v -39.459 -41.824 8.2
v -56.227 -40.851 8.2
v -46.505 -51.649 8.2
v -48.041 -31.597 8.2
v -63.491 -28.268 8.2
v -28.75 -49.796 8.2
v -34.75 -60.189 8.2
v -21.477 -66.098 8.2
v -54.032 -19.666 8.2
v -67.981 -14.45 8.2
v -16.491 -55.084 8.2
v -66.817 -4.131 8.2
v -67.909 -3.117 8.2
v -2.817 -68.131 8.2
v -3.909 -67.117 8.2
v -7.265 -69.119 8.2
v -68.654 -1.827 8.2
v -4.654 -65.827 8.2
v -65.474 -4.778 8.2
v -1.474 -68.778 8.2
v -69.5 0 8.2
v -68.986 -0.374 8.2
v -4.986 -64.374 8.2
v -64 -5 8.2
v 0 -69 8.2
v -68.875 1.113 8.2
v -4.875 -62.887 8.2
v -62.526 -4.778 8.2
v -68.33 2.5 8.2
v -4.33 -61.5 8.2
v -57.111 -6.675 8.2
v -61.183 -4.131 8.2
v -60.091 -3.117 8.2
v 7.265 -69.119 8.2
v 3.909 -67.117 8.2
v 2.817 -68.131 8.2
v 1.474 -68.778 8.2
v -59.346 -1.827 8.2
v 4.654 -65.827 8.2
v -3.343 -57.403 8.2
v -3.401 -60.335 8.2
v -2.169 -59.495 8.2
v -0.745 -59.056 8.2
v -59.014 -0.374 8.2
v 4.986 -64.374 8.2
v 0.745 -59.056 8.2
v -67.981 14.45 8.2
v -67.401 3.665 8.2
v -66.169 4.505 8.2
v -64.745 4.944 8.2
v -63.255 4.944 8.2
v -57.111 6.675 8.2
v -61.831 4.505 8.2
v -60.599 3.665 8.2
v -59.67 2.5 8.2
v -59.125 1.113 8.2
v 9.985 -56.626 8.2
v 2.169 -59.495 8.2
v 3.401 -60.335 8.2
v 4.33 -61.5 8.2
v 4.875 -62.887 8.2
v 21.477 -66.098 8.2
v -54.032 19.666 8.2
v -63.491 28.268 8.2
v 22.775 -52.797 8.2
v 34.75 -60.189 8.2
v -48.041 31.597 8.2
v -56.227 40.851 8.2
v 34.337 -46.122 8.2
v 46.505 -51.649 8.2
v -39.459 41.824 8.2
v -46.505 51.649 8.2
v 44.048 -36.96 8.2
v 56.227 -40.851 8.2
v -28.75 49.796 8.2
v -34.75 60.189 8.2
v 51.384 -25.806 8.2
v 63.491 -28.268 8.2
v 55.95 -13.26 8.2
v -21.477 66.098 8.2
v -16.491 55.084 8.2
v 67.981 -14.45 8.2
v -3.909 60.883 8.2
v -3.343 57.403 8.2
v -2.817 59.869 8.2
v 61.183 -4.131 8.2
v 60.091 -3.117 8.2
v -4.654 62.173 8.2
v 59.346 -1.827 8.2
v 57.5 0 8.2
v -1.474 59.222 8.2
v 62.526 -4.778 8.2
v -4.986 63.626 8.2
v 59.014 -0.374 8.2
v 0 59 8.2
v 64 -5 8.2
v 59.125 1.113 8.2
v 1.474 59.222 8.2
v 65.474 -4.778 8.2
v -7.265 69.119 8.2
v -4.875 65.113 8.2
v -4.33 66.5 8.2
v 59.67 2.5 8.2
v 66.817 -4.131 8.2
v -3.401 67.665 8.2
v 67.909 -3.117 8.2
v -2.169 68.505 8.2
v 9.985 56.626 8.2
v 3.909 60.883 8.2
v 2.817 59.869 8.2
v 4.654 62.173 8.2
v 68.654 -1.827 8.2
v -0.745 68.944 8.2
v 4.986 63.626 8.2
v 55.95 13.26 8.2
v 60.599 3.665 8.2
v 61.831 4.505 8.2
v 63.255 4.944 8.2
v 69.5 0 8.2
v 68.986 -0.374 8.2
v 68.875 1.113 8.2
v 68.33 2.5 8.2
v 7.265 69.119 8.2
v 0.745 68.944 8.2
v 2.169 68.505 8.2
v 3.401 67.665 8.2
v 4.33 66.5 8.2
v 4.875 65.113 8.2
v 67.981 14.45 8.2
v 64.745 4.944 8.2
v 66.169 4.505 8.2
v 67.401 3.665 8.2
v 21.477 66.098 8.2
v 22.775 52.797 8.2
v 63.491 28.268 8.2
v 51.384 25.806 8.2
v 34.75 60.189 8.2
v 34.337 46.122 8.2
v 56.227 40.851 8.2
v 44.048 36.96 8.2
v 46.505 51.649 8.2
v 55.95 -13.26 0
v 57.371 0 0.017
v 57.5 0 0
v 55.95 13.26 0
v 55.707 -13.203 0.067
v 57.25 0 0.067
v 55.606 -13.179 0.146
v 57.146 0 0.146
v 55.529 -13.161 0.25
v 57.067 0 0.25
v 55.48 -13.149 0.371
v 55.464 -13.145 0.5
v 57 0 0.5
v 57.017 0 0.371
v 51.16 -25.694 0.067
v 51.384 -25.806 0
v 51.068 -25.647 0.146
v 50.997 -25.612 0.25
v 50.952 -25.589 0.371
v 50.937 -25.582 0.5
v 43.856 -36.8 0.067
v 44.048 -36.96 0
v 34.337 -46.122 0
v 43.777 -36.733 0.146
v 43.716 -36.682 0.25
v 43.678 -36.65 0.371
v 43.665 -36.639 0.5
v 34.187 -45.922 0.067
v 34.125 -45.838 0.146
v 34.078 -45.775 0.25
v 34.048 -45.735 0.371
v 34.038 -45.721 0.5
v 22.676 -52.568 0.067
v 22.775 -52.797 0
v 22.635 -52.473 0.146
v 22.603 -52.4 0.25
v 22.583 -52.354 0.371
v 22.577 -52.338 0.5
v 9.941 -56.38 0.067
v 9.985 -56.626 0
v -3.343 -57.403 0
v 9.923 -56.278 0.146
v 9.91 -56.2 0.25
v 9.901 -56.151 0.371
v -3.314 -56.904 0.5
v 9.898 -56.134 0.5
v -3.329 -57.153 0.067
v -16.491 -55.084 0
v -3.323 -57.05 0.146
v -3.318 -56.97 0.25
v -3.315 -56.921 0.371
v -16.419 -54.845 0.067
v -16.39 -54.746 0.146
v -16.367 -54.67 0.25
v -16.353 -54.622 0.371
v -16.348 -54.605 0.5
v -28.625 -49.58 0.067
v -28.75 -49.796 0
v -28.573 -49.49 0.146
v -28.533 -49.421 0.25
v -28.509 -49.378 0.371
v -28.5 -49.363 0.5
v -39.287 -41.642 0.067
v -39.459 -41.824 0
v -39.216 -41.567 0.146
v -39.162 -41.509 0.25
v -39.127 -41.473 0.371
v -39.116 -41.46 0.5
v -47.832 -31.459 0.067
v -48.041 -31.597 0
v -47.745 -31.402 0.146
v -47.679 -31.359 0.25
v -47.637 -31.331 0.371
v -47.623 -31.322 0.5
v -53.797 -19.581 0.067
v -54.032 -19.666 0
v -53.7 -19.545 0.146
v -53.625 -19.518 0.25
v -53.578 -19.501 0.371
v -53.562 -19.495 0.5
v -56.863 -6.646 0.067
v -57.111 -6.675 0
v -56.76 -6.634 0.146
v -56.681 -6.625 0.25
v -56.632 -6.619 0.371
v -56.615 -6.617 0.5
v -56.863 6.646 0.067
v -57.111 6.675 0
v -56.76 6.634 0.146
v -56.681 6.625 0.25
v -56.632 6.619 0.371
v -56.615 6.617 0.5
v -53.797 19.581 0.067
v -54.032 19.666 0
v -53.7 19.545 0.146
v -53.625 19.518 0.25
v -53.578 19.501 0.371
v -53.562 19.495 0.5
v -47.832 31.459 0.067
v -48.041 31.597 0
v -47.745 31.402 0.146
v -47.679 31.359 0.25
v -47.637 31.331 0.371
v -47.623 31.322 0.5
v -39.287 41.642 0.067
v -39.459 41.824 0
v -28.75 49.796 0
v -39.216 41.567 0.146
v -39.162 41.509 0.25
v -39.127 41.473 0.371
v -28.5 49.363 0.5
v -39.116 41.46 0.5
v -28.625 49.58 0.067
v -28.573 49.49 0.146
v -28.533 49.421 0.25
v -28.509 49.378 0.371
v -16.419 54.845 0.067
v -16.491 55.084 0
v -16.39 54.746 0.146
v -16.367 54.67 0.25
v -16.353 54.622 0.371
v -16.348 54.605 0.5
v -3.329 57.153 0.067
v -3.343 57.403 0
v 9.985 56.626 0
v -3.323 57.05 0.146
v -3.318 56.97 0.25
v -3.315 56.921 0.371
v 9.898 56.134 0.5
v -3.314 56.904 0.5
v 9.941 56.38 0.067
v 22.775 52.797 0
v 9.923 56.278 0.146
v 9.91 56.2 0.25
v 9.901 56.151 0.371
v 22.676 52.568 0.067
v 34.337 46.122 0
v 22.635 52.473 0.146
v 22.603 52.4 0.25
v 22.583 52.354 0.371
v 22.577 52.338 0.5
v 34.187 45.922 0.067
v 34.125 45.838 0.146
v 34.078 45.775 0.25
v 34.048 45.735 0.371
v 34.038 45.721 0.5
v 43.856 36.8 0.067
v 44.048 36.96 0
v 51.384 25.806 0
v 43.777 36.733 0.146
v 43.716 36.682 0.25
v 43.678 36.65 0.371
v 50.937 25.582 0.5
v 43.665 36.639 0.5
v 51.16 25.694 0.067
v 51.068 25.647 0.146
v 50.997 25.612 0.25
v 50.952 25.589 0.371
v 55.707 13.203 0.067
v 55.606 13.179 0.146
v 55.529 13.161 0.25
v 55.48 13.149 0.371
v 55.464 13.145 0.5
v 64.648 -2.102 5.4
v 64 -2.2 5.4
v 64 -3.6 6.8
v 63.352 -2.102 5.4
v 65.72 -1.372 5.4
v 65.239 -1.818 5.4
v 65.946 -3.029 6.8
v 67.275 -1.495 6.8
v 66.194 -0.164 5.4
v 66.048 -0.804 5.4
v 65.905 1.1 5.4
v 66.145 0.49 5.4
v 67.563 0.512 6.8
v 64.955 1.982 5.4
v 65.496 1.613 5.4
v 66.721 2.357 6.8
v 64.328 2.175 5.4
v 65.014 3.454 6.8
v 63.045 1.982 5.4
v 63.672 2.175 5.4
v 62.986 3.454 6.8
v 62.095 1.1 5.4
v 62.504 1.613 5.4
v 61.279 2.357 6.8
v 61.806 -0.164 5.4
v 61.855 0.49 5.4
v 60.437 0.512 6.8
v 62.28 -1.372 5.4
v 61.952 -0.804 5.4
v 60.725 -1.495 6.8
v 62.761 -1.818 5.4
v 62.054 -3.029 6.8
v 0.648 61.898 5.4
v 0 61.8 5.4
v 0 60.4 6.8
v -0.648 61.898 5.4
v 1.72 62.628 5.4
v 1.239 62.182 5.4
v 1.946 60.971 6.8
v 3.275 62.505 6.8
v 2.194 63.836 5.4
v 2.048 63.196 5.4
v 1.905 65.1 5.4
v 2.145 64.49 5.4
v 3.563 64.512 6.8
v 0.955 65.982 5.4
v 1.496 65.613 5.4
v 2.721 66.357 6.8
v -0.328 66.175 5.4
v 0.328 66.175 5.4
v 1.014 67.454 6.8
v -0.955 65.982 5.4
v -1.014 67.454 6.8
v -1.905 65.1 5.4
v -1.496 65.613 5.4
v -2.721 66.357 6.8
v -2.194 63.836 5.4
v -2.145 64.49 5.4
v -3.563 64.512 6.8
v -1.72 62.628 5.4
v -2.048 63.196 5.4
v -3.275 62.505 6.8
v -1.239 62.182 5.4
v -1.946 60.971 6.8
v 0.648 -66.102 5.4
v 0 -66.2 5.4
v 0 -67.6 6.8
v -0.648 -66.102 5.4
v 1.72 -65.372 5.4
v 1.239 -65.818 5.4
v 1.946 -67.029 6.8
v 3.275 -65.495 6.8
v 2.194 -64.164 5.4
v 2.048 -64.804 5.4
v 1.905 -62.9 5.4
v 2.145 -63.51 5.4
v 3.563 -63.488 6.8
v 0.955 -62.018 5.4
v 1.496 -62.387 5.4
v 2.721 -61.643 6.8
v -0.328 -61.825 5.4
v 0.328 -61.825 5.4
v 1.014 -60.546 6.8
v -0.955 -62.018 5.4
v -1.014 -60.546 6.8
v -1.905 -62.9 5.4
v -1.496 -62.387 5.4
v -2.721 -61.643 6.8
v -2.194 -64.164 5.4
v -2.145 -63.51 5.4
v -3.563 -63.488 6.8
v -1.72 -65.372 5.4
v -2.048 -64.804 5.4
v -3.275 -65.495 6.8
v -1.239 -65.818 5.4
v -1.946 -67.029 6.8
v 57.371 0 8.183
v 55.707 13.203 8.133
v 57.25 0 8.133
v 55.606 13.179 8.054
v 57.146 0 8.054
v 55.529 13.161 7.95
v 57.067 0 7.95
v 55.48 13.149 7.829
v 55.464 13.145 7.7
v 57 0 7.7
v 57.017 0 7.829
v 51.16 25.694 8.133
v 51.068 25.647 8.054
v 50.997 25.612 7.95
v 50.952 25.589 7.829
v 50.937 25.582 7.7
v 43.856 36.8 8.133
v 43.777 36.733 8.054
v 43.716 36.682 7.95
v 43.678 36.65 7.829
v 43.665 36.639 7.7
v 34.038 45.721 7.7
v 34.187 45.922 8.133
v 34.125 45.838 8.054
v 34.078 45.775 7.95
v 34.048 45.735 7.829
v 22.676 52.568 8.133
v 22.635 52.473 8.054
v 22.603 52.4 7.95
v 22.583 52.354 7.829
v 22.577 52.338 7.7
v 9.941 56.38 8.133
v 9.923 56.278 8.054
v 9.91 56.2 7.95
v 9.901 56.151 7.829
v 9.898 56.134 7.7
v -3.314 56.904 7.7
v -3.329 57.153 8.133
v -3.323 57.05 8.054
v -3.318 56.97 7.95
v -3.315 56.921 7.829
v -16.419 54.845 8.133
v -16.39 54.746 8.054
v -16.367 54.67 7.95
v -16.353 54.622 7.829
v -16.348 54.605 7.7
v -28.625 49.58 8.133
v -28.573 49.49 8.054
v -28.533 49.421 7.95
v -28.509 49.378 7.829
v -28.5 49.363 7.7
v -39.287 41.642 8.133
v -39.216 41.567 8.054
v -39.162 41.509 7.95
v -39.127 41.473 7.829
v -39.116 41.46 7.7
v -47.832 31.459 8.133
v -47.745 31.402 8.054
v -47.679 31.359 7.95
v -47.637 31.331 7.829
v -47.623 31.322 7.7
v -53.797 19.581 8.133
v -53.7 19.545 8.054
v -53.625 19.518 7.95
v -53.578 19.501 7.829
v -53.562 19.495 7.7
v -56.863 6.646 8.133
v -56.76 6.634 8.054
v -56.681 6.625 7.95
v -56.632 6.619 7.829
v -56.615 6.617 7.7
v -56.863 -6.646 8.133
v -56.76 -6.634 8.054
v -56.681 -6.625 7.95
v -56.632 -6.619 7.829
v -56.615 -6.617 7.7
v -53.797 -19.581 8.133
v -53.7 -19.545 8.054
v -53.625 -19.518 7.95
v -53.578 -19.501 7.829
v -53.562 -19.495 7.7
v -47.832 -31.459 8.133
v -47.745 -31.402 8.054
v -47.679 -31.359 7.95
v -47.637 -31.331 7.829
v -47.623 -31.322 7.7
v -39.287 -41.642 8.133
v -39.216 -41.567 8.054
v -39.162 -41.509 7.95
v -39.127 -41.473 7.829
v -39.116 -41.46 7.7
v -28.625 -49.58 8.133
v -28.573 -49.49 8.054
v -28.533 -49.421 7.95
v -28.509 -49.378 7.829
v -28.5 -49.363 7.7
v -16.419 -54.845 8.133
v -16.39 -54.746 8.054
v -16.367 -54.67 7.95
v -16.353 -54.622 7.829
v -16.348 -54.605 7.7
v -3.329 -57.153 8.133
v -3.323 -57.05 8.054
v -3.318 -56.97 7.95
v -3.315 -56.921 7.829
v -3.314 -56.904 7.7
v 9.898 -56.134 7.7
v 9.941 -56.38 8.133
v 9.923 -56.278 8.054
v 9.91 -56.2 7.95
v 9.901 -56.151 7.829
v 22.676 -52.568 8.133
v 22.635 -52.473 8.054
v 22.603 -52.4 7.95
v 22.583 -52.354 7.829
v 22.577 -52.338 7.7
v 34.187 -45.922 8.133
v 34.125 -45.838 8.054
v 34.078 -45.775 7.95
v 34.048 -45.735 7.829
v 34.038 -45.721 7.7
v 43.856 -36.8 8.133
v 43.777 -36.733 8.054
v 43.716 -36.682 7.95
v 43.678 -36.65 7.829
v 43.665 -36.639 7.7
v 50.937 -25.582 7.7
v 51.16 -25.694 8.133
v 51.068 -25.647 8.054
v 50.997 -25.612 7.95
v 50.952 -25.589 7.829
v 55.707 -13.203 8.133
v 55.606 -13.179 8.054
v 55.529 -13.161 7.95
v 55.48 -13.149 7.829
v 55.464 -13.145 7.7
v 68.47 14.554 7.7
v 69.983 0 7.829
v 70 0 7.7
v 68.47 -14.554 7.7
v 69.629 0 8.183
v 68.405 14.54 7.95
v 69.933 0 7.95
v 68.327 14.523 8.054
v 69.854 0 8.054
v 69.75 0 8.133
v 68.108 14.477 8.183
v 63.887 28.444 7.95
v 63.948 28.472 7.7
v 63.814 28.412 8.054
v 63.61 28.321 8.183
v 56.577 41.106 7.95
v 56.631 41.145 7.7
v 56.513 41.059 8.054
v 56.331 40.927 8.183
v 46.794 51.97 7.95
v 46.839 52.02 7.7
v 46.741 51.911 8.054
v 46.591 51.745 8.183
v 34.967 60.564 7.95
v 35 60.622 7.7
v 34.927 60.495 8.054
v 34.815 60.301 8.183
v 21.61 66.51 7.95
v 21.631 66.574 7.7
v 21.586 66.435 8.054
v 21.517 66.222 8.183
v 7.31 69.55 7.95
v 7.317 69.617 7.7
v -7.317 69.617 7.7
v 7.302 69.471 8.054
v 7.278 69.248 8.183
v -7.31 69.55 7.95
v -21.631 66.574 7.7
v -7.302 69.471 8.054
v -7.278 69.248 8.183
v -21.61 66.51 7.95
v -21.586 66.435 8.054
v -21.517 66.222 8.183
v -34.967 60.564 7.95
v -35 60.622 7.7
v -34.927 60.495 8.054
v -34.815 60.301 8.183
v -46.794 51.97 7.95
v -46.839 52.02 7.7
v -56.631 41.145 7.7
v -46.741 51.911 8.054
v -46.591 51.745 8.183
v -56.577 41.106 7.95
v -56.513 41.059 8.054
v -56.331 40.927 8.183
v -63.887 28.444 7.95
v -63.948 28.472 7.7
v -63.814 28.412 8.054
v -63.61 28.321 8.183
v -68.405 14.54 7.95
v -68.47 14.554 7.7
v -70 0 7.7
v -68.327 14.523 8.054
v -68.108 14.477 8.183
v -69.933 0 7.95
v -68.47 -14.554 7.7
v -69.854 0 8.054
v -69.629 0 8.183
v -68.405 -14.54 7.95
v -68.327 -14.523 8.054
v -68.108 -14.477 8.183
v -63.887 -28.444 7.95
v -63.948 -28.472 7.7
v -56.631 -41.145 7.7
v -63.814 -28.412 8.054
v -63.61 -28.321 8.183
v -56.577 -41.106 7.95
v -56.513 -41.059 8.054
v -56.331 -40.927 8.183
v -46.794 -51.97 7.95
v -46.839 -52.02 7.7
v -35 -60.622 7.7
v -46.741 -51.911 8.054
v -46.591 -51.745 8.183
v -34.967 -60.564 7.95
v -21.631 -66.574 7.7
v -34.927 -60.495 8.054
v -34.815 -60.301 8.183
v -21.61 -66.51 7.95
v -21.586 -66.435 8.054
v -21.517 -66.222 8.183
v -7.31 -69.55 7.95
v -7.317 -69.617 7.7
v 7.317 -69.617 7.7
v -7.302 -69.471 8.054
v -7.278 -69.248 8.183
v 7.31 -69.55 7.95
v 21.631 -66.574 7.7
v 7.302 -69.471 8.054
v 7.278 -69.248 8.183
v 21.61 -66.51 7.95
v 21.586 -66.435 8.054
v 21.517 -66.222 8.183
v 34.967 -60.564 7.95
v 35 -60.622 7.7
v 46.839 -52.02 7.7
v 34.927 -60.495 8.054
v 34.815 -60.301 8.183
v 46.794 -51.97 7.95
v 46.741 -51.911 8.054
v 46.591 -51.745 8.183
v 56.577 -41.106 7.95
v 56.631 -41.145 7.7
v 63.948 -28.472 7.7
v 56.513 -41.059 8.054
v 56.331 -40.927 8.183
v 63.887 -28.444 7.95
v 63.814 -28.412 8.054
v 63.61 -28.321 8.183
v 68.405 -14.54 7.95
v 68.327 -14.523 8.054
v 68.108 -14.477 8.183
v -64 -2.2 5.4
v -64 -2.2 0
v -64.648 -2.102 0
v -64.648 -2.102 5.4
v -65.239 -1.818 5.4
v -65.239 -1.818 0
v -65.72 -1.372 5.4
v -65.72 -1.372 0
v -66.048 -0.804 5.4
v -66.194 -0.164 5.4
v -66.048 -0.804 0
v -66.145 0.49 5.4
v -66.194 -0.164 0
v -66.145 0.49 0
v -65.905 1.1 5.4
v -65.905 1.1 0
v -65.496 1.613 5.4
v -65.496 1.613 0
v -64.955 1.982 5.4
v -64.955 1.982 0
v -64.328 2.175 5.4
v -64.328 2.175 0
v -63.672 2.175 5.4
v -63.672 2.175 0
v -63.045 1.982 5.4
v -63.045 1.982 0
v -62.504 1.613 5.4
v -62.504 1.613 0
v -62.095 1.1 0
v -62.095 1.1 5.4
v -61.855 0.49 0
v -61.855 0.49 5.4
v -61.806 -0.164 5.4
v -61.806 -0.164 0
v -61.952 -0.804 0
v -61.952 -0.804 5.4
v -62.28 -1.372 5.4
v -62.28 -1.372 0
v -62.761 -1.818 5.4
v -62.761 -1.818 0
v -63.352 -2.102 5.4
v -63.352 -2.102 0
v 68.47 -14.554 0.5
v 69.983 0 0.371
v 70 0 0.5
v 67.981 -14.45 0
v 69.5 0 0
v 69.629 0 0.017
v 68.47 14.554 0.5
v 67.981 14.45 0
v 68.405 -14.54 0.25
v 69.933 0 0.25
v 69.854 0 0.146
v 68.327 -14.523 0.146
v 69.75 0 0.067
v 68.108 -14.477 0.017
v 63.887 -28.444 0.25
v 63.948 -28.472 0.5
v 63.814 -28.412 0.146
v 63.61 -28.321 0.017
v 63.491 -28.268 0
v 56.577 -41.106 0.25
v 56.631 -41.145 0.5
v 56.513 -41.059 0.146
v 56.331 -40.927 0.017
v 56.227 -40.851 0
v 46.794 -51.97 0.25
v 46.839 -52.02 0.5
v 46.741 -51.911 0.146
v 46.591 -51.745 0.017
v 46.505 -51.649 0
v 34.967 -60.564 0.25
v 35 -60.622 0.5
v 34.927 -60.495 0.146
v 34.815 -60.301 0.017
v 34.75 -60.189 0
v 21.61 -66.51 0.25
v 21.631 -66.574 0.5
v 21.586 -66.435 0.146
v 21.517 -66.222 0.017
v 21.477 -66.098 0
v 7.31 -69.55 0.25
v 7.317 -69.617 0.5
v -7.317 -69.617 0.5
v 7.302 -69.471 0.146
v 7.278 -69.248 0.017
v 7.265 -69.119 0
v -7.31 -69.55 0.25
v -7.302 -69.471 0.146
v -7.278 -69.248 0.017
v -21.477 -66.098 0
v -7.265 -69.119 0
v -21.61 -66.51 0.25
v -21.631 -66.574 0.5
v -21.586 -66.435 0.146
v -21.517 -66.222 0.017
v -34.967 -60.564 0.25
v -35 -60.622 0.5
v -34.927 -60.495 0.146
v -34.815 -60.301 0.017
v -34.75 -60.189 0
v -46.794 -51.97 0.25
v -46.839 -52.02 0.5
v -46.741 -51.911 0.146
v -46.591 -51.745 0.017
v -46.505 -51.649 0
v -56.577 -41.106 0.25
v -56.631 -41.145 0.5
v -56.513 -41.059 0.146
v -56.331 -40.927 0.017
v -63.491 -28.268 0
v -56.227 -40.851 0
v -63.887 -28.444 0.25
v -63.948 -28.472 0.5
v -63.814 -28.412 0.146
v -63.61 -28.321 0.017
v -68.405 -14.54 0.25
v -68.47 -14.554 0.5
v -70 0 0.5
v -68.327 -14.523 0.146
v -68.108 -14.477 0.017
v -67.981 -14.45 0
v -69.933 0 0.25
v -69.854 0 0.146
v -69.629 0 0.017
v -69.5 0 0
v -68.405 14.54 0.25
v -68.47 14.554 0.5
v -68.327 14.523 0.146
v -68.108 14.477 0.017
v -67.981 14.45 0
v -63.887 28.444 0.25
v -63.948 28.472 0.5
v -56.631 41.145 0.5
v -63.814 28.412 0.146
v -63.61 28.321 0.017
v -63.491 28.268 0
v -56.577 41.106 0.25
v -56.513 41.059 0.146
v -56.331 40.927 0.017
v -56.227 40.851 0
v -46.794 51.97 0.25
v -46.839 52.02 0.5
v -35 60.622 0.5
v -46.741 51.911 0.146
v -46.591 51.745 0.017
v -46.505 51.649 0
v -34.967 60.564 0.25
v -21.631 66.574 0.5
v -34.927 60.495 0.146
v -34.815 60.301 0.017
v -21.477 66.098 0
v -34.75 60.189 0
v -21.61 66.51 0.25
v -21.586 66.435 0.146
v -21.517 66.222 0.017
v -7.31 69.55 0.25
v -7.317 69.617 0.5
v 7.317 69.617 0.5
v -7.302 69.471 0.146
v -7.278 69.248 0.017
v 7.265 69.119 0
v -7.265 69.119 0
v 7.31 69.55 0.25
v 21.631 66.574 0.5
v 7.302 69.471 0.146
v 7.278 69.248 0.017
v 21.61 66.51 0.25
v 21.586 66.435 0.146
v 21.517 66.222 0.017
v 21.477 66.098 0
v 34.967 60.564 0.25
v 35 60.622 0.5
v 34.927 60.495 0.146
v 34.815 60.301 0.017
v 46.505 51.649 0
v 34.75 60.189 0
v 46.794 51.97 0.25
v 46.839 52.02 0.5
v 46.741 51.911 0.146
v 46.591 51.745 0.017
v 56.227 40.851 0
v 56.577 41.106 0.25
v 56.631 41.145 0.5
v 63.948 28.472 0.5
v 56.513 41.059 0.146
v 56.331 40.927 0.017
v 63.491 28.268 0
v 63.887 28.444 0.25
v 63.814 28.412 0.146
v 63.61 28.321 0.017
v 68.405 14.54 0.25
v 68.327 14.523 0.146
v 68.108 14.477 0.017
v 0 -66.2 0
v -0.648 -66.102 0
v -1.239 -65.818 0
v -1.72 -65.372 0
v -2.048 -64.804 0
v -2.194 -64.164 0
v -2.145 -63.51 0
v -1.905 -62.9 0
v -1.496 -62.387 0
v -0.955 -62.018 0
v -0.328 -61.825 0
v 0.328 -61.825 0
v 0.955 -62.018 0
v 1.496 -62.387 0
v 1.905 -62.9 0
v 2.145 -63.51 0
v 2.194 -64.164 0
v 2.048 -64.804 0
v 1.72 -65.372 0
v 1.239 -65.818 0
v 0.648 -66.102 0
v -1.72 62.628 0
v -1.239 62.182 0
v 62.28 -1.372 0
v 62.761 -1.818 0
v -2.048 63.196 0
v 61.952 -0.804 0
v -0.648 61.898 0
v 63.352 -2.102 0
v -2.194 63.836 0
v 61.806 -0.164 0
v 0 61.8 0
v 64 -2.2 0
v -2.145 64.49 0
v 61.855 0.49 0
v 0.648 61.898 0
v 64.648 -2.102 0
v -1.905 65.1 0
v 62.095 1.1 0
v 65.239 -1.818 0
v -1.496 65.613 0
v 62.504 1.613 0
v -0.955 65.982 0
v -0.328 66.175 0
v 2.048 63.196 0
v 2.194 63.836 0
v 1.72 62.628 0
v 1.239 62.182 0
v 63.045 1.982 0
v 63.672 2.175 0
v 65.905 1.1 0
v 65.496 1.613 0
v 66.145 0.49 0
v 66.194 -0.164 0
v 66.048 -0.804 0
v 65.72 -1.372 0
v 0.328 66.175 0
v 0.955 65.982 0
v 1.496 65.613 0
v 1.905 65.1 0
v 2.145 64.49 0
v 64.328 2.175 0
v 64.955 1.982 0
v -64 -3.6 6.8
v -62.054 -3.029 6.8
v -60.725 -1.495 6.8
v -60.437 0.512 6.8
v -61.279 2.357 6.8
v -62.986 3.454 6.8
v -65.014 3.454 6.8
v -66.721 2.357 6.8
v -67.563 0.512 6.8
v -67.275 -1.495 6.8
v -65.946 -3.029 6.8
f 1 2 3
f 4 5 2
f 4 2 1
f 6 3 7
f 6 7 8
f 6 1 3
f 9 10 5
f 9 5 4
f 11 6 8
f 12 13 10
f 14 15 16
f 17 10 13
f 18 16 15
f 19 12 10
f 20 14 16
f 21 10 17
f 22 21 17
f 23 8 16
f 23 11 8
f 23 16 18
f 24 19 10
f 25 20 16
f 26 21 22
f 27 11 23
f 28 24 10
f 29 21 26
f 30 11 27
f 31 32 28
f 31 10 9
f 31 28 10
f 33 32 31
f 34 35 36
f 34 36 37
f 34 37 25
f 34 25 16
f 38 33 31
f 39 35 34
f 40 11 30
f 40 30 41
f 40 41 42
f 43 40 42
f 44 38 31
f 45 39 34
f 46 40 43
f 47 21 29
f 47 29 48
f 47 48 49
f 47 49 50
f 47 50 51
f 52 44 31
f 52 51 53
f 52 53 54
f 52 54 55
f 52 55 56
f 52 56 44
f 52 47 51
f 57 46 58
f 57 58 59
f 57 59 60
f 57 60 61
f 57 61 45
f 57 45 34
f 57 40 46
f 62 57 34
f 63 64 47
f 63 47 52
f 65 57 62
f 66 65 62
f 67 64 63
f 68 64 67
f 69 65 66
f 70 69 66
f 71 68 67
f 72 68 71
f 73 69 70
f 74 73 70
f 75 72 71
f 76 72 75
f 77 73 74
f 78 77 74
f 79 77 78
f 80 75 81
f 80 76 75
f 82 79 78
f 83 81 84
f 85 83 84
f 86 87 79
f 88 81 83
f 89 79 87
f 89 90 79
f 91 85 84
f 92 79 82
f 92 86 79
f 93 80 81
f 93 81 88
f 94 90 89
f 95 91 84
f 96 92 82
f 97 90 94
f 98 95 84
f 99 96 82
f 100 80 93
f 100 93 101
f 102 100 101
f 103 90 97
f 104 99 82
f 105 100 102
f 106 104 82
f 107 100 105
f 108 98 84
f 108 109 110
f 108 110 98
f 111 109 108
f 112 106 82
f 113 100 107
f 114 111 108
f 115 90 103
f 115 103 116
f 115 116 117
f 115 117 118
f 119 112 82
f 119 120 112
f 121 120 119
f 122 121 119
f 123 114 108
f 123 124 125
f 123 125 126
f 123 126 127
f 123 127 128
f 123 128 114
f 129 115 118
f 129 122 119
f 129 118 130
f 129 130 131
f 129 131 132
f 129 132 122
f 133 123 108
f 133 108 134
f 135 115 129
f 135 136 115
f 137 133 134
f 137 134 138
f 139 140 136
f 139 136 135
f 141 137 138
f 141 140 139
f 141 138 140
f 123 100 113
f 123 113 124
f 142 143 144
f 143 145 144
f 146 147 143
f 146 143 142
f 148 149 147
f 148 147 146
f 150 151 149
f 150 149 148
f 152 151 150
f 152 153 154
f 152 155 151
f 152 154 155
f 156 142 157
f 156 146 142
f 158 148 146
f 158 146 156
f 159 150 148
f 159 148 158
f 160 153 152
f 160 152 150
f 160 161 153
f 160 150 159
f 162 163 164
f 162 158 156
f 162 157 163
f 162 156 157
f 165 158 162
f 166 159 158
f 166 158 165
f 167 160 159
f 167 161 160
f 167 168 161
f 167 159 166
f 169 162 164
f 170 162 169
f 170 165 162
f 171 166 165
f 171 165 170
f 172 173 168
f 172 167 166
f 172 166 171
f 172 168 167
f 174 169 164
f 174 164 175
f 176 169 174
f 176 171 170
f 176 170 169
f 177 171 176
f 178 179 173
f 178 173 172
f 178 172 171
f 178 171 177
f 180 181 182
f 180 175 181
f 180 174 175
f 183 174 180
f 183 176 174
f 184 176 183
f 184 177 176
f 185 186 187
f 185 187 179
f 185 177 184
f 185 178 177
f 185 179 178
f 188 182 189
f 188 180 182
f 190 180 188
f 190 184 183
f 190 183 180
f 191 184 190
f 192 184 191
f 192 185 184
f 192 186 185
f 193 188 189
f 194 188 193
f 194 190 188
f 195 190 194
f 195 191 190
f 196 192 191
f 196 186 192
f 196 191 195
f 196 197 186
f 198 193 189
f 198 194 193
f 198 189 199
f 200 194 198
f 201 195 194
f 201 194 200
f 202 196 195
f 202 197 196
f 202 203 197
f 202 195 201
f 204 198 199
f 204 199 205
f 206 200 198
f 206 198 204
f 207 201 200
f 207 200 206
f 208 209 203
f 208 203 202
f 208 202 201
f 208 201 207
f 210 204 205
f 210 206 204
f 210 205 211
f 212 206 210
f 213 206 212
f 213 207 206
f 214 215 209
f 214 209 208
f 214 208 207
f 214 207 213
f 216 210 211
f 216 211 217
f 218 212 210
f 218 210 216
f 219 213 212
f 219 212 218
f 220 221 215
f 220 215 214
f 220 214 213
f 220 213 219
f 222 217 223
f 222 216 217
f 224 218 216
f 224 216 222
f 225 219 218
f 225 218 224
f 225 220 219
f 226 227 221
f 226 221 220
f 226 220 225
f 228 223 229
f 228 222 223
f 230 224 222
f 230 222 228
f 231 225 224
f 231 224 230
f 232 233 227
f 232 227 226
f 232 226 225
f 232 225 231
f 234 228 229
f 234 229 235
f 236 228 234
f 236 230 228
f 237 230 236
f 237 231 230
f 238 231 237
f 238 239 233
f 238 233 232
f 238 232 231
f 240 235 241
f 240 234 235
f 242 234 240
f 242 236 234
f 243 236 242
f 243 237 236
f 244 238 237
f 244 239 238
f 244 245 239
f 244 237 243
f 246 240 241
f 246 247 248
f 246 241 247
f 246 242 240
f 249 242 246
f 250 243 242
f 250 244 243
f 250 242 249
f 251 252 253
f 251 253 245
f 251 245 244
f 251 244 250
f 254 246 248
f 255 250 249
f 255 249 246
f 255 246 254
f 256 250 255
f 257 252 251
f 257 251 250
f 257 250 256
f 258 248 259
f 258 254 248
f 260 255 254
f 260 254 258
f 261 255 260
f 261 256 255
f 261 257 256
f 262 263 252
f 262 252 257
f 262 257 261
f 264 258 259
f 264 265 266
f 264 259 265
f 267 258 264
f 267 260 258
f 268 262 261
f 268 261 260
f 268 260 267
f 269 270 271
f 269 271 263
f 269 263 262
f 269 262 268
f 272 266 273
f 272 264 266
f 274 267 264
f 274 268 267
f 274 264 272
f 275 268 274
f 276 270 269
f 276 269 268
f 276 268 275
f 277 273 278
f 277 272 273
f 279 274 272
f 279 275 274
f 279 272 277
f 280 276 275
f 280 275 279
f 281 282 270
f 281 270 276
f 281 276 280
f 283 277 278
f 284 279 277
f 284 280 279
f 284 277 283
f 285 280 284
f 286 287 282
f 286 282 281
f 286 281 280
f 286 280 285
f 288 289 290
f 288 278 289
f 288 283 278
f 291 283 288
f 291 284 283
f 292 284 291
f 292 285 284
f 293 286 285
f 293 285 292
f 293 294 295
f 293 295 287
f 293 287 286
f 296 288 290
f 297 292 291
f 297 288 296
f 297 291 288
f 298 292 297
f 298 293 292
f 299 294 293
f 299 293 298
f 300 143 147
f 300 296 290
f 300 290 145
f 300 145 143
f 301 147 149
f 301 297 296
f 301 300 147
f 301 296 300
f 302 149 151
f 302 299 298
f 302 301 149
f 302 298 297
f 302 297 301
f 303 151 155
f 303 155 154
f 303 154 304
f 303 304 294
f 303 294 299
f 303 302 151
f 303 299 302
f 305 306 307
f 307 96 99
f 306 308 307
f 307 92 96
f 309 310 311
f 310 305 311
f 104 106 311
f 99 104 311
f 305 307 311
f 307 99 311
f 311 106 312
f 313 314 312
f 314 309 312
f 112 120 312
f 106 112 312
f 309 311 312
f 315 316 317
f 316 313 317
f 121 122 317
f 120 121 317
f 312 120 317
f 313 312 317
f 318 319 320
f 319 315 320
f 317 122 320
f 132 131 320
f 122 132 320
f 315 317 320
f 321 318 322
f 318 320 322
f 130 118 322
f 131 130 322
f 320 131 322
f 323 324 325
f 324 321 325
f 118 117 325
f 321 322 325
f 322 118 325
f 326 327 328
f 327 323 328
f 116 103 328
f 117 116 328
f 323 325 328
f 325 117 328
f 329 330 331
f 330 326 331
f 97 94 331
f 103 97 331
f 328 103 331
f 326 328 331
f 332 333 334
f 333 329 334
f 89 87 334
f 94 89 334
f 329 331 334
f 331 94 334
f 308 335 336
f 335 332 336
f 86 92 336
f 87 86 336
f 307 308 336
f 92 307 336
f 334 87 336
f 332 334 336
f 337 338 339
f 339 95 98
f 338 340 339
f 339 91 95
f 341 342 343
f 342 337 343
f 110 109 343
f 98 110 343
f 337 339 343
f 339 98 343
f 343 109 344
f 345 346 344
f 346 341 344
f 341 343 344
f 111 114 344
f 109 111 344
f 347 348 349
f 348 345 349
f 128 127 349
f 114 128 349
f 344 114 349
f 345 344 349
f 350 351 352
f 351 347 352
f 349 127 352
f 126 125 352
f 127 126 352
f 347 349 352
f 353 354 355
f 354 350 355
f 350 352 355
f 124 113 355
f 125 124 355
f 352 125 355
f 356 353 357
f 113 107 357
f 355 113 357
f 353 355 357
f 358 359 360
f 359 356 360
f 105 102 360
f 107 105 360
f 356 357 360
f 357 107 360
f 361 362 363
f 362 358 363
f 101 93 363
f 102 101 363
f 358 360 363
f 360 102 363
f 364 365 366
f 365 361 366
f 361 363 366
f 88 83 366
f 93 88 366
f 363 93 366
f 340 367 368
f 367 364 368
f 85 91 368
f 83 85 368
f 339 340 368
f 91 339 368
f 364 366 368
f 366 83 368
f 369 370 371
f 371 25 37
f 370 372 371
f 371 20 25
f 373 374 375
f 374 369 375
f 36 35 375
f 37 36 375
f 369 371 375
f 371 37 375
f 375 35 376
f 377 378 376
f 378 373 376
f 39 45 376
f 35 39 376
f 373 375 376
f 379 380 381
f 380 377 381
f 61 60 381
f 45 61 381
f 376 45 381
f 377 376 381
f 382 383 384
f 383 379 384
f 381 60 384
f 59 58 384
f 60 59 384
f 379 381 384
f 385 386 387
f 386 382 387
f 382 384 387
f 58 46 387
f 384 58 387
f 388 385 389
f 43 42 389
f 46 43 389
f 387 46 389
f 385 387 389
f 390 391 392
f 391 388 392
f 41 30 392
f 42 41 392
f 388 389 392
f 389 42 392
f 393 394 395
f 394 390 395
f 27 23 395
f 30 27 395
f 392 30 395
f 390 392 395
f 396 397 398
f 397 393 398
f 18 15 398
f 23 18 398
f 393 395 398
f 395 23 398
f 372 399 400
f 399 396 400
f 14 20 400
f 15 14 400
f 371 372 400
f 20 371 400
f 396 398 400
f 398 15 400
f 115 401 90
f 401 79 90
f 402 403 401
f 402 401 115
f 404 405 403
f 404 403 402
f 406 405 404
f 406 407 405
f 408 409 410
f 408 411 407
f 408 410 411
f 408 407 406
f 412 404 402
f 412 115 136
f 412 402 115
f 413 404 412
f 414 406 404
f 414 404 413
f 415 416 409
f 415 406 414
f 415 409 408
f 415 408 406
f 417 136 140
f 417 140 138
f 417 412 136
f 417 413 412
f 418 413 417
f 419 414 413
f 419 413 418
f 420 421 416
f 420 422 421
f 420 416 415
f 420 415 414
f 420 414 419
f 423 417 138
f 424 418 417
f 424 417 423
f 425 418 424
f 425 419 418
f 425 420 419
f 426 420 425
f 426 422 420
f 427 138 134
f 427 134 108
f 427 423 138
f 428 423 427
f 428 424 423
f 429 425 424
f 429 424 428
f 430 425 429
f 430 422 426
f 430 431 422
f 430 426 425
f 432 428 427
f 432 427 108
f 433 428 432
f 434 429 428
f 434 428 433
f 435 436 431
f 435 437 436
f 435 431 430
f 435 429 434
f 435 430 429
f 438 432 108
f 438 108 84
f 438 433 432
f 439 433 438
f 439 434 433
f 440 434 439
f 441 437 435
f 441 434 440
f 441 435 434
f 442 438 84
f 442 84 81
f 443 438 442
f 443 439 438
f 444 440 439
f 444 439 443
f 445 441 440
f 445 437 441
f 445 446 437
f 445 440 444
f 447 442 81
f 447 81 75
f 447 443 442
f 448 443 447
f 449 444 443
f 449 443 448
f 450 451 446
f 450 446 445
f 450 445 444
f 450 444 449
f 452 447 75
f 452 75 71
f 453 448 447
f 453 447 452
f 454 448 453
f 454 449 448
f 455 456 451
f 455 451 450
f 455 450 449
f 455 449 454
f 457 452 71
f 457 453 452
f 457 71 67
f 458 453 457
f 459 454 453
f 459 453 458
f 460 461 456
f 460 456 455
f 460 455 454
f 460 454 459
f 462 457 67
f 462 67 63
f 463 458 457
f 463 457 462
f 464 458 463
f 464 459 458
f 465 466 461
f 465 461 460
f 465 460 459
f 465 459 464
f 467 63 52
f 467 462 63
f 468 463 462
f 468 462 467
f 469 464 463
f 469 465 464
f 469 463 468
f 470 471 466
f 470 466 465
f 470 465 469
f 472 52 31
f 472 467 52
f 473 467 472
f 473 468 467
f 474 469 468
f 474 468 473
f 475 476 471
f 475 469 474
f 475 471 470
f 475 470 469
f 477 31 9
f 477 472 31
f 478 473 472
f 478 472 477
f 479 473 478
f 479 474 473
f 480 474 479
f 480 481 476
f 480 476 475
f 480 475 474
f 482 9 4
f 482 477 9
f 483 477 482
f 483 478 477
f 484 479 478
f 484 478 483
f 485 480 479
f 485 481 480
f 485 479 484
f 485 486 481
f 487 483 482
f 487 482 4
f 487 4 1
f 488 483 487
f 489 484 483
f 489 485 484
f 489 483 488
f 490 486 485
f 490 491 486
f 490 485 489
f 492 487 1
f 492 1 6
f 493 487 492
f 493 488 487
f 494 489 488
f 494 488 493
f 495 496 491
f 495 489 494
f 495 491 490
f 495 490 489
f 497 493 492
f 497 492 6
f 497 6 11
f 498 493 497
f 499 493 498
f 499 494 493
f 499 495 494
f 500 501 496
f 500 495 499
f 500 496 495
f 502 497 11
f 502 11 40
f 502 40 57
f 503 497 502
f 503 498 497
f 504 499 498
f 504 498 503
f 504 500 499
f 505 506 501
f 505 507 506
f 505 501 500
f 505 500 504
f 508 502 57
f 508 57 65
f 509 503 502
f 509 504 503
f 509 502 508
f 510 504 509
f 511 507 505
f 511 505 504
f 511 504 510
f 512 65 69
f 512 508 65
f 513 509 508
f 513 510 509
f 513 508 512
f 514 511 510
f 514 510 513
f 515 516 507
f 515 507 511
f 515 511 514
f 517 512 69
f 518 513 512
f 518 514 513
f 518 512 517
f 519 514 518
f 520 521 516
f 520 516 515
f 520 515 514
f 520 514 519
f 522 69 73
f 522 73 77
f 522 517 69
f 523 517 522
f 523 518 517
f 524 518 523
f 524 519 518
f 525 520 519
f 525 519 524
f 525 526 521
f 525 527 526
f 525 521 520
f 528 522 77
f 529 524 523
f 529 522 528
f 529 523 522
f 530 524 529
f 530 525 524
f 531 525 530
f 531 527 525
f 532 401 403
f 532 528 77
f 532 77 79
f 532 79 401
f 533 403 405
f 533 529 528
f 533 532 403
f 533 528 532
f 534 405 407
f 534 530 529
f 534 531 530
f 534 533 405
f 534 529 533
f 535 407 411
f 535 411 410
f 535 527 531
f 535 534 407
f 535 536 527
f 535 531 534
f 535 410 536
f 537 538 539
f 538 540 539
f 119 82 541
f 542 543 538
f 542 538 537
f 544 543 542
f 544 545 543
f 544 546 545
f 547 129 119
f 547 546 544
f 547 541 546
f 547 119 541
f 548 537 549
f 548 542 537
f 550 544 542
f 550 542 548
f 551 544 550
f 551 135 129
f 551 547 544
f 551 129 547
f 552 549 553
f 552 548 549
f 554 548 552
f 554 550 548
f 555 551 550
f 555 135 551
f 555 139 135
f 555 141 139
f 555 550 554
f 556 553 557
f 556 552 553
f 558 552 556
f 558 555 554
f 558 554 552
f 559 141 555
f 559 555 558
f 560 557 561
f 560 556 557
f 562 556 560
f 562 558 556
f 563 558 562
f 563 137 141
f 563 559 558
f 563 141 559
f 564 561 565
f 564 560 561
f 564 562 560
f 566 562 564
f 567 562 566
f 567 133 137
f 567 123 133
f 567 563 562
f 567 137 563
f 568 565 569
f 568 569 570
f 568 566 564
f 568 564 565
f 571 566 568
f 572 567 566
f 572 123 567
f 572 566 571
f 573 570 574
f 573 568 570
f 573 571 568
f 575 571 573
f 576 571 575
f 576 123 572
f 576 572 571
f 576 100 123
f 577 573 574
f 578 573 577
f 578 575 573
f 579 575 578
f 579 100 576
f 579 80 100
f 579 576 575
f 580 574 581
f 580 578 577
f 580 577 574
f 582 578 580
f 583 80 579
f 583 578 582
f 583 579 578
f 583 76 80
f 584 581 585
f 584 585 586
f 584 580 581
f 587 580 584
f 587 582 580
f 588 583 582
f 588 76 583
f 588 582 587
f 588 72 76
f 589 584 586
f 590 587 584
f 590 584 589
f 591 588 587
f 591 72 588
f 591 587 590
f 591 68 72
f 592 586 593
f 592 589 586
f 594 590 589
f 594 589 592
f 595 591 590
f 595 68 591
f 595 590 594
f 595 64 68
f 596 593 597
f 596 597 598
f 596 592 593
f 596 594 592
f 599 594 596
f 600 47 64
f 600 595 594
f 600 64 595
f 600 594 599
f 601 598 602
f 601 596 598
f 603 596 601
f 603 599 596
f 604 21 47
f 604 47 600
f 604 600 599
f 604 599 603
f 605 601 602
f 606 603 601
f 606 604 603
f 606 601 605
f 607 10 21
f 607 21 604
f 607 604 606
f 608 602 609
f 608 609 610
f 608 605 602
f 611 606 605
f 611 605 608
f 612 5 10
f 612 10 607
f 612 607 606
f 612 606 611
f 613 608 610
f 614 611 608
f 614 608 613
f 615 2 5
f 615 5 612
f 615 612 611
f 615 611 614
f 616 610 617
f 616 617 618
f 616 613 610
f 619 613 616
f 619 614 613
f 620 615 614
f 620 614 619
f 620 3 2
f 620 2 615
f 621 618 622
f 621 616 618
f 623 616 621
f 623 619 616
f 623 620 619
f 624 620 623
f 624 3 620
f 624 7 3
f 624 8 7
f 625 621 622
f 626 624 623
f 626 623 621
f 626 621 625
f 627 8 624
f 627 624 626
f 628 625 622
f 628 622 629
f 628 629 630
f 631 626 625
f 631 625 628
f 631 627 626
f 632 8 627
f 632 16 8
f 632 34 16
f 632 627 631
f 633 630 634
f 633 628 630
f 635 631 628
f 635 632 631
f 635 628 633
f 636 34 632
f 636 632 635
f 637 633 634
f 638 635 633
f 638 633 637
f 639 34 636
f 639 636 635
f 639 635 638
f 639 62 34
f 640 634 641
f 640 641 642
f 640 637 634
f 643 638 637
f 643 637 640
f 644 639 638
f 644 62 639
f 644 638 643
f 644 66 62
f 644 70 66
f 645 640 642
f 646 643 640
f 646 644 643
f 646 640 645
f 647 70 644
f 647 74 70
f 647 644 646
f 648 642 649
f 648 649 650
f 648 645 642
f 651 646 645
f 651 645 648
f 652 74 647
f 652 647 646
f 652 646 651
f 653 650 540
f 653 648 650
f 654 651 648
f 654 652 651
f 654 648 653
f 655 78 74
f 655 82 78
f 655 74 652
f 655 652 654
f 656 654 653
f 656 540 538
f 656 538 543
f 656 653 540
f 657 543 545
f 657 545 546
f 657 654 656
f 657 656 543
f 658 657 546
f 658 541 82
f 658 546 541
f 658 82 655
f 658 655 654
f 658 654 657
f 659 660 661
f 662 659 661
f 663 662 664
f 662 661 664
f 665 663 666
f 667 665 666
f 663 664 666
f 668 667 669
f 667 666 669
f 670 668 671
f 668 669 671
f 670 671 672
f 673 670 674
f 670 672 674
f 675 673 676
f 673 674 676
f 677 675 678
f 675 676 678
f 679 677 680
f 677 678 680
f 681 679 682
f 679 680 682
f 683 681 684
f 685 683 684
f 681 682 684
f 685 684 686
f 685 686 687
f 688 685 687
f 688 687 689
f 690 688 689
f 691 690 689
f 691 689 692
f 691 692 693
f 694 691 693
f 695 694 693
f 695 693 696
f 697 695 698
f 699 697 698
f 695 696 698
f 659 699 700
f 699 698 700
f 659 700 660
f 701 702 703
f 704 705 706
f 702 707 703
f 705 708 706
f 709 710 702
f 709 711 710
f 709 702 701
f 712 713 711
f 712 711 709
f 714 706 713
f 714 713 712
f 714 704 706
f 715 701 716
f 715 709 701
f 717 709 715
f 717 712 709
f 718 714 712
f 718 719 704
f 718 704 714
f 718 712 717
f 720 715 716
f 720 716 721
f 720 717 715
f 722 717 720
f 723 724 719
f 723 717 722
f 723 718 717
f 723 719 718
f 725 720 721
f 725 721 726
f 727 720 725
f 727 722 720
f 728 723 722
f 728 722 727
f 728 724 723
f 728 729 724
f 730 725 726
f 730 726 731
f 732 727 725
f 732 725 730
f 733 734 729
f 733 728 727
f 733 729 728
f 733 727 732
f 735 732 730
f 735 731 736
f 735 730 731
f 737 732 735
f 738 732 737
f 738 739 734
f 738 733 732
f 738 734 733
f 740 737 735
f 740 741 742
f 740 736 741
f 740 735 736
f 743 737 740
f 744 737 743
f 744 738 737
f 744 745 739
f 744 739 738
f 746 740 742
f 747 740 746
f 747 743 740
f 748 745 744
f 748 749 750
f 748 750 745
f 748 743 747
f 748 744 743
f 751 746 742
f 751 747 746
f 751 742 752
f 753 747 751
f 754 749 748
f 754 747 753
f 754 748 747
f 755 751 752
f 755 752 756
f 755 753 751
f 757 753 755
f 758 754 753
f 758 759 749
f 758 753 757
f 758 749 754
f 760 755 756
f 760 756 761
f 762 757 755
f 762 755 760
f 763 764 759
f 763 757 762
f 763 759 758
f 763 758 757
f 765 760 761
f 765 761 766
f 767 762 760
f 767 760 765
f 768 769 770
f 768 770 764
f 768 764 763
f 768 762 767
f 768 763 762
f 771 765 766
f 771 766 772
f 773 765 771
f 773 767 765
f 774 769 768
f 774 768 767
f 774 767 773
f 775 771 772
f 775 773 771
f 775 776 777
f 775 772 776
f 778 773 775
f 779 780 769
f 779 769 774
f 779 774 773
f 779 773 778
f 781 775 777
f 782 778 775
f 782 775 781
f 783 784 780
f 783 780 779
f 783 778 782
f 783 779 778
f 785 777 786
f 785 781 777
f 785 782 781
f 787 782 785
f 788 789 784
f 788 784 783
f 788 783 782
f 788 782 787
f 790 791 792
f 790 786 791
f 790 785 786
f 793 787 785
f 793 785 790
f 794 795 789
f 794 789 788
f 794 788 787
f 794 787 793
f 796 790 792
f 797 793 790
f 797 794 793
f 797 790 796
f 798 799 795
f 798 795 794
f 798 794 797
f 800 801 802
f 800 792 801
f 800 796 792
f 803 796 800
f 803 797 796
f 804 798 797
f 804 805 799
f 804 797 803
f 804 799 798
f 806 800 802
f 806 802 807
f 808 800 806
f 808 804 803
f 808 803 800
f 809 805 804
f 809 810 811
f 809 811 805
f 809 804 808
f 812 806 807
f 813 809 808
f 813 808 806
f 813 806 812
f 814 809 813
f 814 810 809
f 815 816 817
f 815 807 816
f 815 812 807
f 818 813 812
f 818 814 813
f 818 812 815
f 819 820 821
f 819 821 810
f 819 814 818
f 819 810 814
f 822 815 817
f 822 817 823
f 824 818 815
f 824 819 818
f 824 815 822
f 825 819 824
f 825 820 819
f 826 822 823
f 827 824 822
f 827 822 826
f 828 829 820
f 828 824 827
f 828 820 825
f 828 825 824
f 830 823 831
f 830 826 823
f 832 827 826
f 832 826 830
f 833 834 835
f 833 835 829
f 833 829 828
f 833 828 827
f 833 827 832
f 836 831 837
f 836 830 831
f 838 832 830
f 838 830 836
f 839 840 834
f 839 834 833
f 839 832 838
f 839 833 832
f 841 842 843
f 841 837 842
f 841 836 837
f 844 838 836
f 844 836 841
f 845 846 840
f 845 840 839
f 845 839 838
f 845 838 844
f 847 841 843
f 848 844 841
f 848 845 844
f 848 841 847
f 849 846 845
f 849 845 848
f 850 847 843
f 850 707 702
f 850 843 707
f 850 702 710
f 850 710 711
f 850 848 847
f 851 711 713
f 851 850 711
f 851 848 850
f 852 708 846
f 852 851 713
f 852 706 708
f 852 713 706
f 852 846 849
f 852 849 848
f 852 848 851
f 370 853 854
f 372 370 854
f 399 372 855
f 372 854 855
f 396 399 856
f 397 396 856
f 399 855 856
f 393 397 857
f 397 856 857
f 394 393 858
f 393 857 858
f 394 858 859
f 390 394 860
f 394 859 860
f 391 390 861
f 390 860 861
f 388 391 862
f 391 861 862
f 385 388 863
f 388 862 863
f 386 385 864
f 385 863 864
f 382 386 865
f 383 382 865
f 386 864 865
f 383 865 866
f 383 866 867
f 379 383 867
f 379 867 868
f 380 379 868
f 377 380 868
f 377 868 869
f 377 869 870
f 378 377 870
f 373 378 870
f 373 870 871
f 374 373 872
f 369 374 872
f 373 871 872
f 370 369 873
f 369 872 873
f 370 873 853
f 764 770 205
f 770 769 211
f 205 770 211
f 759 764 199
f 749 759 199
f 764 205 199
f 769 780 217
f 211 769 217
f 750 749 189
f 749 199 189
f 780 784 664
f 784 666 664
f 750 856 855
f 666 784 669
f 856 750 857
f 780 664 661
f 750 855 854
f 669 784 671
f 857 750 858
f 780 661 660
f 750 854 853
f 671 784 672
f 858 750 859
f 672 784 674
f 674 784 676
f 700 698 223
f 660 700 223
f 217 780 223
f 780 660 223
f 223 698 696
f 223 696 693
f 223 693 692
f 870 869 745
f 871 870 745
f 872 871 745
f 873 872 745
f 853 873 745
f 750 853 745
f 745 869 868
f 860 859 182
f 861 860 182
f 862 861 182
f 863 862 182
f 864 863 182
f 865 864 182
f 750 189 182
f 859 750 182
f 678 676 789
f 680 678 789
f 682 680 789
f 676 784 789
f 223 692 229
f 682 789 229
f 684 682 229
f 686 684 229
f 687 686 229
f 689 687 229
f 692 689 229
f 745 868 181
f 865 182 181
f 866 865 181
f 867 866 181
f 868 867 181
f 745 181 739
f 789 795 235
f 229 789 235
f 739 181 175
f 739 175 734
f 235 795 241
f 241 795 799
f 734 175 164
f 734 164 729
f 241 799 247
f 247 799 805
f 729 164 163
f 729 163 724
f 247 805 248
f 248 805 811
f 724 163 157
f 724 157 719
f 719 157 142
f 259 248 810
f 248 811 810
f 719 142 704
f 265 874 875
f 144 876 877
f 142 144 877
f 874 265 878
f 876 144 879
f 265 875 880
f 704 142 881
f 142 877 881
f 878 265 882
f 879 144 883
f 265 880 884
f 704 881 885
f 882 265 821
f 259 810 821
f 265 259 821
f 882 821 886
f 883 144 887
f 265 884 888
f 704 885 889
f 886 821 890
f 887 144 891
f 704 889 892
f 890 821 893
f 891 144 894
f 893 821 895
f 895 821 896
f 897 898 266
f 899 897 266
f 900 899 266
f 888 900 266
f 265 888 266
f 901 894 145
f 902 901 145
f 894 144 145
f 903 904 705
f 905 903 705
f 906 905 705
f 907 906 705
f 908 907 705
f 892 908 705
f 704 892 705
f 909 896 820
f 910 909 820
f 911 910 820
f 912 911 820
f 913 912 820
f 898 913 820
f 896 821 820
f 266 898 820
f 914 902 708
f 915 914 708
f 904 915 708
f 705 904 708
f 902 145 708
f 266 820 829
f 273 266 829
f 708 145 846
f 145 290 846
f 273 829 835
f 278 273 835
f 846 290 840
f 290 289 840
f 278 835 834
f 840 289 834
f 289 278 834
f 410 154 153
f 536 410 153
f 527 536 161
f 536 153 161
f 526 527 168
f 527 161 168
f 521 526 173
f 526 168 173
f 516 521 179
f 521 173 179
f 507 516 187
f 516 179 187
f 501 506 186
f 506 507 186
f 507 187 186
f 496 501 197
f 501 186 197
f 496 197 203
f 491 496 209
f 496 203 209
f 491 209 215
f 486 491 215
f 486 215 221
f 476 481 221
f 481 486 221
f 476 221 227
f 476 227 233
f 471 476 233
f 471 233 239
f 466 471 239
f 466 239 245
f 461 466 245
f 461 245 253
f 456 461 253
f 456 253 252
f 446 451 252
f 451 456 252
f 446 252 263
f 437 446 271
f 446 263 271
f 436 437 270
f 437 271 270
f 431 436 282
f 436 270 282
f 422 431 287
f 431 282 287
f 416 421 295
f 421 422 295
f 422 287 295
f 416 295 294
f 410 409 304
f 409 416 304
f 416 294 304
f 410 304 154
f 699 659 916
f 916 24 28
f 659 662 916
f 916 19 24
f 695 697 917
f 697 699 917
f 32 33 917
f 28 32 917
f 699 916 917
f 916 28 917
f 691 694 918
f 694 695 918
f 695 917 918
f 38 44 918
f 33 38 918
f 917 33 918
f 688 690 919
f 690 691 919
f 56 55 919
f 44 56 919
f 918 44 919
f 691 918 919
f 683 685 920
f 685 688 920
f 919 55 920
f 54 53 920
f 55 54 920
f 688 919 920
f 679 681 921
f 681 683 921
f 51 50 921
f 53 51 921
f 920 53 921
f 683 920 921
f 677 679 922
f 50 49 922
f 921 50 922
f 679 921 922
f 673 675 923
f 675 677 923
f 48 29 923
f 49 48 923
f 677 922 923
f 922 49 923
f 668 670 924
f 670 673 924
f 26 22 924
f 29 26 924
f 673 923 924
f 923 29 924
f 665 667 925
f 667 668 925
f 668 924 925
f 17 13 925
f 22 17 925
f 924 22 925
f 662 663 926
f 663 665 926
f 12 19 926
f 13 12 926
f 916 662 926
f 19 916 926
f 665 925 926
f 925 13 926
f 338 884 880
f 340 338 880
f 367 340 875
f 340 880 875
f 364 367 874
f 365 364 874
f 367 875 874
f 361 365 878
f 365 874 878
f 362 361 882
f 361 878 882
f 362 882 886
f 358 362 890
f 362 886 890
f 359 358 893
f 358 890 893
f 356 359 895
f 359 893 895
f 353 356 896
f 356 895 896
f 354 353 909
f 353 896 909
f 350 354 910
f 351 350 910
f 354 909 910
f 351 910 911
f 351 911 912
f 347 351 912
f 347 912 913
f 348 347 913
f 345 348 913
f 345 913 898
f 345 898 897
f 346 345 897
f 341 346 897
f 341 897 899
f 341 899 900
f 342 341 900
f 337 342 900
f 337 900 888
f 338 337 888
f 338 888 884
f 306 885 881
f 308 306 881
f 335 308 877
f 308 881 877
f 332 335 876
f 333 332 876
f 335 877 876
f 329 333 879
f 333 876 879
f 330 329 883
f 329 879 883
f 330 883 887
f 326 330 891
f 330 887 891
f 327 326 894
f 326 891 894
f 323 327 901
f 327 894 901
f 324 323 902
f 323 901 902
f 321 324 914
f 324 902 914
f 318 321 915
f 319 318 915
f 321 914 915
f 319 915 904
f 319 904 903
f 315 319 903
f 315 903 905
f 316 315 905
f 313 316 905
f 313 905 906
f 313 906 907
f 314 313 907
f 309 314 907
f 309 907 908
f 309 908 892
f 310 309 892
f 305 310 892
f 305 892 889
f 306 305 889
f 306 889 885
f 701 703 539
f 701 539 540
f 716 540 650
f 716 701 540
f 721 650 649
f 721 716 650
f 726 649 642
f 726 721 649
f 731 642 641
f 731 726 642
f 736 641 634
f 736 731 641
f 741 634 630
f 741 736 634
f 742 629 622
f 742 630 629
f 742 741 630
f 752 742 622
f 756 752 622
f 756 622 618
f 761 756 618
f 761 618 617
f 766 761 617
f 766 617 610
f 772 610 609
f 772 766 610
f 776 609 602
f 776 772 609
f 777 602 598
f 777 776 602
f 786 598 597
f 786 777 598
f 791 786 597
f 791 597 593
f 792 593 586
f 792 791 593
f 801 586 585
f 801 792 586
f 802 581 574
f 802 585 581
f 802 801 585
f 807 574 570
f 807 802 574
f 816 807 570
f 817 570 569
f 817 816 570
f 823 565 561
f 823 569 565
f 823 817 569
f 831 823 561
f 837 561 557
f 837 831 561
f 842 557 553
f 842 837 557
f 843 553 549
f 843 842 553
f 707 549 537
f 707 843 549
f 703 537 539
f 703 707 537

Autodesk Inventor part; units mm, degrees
ref_plane "YZ Plane" through (0, 0, 0) normal (1, 0, 0) x (0, 1, 0)
ref_plane "XZ Plane" through (0, 0, 0) normal (0, 1, 0) x (-1, 0, 0)
ref_plane "XY Plane" through (0, 0, 0) normal (0, 0, 1) x (1, 0, 0)
sketch "スケッチ1" plane through (0, 0, 0) normal (0, 0, 1) x (1, 0, 0)
  circle A0 centre (0, 0) radius 70
  circle A1 centre (0, 0) radius 57
  dimension "d0" = 140
  dimension "d1" = 114
extrude "押し出し1" add sketch "スケッチ1" along normal blind 8.2
sketch "スケッチ2" plane through (0, 0, 8.2) normal (0, 0, 1) x (1, 0, 0)
  point P0 (0, 0)
  point P1 (-64, 0)
  point P2 (0, -64)
  point P3 (64, 0)
  point P4 (0, 64)
  dimension "d4" = 64
  dimension "d7" = 360
hole "穴1" at (-64, 0, 8.2) at (0, -64, 8.2) at (64, 0, 8.2) at (0, 64, 8.2) direction (0, 0, -1) diameter 4.4 end through all countersink diameter 10 countersink angle 90
fillet "フィレット1" radius 0.5 4 edges at (-70, 0, 0) (-57, 0, 0) (-70, 0, 8.2) (-57, 0, 8.2)
properties part number "TurnTable_140_Outer" material "鋼、合金"
